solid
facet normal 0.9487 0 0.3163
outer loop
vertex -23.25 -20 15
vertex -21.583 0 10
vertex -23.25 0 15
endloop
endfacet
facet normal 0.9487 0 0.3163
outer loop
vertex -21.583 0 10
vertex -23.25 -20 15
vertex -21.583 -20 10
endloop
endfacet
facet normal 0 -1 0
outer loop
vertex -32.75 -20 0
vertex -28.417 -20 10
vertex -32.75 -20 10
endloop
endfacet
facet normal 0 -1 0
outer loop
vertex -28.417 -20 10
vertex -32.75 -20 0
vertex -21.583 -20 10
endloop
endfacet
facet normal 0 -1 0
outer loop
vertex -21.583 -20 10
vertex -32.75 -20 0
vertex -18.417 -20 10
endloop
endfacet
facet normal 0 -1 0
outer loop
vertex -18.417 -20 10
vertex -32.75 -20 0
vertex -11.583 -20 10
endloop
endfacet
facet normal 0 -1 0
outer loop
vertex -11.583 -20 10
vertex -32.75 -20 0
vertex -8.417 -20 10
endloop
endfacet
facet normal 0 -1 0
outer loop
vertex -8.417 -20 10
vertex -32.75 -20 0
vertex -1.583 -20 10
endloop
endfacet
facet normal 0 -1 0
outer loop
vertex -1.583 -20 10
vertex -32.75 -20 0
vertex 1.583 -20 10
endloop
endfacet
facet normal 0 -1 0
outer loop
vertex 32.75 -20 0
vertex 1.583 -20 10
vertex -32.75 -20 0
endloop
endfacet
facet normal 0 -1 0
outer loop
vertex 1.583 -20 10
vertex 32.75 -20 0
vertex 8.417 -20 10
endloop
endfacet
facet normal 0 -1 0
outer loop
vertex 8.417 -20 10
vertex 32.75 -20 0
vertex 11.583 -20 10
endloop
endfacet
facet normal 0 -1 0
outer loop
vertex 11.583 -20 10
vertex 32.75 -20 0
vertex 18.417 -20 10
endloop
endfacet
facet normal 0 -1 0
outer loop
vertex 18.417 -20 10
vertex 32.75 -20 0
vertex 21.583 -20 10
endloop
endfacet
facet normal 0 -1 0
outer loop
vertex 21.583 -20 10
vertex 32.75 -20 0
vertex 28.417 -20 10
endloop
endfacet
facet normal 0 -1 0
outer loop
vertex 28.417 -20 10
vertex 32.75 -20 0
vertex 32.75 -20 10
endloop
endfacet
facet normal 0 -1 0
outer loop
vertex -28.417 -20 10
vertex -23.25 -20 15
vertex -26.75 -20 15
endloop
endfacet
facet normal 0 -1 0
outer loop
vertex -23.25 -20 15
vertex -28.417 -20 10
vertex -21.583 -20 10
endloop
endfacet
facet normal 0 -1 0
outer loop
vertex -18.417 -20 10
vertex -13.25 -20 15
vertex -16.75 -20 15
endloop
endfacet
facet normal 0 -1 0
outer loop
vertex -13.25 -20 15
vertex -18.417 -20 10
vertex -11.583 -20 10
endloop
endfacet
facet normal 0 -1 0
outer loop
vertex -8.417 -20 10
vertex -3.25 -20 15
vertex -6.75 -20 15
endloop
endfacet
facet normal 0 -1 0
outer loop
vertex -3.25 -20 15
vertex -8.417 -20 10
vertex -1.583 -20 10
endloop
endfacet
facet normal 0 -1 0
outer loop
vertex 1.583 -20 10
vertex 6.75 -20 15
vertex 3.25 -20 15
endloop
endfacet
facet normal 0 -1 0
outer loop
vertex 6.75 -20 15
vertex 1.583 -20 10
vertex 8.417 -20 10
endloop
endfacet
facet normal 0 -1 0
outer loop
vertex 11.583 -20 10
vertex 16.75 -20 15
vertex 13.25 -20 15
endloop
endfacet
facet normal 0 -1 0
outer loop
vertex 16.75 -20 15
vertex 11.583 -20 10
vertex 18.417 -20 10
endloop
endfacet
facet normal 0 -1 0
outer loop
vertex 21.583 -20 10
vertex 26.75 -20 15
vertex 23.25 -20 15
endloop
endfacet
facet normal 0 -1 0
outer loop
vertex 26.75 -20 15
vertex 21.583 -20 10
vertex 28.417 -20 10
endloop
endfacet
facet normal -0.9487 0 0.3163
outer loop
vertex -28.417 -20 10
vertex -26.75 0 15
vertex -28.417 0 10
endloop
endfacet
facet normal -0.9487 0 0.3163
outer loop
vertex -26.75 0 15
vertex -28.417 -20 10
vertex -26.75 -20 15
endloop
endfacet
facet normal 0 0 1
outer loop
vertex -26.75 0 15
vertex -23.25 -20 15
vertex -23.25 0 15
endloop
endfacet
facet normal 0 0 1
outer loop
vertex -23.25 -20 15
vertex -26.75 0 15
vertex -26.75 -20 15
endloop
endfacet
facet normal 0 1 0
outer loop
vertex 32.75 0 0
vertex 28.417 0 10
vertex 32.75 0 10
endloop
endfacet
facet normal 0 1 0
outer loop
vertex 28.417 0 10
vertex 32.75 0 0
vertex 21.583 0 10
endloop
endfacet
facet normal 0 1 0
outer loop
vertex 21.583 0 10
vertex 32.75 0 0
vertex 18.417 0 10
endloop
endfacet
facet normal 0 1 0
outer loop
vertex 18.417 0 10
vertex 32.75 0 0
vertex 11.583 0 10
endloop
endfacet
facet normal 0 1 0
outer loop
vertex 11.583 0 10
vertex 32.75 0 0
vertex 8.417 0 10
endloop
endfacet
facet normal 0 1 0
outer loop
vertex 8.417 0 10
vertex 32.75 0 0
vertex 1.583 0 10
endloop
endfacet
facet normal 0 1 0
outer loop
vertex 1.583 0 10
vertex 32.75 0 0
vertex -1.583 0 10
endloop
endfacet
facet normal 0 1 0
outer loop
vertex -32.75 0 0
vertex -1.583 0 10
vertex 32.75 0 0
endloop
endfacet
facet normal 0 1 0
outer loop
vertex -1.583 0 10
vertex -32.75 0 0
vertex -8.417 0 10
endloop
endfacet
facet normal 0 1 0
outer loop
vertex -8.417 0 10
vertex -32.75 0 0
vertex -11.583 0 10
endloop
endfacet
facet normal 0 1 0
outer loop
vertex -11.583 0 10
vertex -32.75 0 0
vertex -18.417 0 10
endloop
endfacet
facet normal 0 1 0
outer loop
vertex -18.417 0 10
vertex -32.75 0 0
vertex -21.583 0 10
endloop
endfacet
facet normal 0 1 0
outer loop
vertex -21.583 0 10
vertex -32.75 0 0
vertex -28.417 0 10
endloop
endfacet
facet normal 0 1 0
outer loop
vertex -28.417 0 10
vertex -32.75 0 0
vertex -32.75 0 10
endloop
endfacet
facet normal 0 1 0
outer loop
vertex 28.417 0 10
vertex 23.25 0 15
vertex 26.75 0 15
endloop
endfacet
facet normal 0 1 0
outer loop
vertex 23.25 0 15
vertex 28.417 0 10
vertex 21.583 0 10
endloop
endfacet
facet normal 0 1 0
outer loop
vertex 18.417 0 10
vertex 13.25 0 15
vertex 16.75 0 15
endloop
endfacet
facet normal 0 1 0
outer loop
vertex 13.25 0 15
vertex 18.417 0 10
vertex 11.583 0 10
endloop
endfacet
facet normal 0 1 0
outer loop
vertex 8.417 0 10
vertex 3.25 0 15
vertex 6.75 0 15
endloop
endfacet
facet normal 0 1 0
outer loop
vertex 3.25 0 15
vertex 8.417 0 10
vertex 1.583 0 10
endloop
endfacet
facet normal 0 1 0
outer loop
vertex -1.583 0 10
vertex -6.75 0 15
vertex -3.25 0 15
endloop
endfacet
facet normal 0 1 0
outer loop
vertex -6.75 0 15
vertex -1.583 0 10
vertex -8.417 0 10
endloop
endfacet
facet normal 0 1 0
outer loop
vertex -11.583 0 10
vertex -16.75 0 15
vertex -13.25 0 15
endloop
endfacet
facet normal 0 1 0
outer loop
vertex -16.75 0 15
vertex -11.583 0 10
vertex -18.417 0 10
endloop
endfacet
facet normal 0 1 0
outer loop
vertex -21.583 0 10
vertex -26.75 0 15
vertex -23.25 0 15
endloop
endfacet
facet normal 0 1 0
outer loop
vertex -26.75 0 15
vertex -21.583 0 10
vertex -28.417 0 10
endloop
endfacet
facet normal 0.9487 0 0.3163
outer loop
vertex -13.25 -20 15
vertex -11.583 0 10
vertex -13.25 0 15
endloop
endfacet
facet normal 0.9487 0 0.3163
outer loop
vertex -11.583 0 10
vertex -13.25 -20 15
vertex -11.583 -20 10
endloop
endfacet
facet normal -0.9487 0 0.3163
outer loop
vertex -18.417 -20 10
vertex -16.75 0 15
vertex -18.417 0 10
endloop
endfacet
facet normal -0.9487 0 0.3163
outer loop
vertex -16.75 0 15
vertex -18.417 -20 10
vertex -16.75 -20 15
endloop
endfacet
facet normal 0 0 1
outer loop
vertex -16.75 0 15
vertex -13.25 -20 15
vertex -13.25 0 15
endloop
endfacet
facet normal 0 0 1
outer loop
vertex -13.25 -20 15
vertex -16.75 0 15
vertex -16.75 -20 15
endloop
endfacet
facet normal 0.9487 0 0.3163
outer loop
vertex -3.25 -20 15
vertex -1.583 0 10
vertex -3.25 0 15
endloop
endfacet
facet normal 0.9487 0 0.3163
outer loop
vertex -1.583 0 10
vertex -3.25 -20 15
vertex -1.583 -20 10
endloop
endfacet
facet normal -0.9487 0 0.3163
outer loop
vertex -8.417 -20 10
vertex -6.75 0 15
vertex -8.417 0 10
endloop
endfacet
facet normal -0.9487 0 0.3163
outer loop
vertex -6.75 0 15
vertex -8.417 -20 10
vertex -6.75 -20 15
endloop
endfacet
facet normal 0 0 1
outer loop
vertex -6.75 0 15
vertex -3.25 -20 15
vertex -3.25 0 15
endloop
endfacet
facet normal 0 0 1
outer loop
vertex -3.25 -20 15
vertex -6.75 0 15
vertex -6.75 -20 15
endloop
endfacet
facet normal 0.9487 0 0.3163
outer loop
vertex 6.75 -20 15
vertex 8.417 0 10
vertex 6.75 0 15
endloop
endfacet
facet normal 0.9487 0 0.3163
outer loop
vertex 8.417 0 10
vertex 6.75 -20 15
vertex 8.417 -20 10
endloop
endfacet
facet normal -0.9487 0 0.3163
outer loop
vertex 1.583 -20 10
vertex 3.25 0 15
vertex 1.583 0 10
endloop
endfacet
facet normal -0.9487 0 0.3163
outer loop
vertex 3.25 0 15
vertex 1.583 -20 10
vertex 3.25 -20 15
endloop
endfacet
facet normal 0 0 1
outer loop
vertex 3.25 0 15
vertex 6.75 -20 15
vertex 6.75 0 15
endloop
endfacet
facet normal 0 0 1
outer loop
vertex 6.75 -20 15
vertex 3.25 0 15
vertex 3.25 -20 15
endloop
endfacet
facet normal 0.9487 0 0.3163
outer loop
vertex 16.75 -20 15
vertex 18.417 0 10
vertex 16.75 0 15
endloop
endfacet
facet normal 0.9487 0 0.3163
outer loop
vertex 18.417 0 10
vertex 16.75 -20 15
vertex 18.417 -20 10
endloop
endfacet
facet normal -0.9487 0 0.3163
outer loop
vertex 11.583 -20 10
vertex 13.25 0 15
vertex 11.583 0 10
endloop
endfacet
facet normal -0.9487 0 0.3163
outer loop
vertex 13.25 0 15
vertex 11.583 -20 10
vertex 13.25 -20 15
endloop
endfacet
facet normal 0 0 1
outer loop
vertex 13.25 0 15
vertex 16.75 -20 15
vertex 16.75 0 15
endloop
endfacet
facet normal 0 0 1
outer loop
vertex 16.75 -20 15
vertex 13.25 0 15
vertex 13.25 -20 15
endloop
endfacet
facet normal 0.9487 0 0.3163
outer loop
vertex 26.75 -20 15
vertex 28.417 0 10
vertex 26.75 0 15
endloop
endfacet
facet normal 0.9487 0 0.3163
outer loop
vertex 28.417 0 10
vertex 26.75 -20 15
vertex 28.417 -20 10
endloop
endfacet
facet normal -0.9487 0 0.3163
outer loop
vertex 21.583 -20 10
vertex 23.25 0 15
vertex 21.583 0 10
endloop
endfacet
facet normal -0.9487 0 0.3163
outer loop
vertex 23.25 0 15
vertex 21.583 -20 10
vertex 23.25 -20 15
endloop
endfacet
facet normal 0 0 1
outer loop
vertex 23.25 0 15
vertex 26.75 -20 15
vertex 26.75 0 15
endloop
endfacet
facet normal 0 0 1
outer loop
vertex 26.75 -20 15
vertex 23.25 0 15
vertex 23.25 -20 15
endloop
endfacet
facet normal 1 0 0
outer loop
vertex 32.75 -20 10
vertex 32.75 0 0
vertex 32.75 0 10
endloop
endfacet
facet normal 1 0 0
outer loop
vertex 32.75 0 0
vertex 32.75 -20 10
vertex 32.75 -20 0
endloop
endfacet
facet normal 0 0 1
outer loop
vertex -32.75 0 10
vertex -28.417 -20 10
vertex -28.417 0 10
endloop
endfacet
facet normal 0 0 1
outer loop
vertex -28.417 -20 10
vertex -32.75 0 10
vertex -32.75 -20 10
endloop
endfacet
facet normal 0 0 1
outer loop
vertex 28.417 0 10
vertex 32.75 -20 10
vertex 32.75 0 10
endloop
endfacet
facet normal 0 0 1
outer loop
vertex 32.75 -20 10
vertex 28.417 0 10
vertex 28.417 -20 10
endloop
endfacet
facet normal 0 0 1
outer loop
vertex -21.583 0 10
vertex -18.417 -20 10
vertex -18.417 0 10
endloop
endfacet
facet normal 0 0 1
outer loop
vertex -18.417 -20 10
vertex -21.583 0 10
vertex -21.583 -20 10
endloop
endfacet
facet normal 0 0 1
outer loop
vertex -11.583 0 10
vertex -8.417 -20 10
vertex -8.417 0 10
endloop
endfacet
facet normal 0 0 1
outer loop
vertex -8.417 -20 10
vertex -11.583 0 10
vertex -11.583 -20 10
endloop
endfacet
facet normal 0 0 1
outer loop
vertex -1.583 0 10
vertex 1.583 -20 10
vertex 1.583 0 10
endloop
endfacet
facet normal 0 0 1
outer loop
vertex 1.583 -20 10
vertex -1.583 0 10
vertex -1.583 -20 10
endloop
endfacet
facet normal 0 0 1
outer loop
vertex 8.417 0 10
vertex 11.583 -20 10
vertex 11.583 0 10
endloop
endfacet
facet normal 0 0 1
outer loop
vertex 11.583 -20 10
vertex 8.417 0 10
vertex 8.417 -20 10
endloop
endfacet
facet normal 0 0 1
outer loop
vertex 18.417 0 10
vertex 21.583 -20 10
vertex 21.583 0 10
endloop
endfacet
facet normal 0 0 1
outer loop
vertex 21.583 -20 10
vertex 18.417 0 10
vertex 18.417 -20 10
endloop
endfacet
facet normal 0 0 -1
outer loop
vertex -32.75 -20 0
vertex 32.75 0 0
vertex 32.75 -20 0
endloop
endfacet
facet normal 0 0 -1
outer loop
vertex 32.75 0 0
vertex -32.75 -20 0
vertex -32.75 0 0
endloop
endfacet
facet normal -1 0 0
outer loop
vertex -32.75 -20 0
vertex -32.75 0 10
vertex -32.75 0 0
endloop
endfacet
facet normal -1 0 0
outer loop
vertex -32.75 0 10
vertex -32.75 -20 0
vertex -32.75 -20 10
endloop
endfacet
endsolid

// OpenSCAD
$fn = 32;

// ----------------------------------------------------------------------
// Toothed rack, 6 teeth
// 10 mm pitch, 5 mm teeth
// ----------------------------------------------------------------------

// --- parameters (mm) ---
bar_w = 20;     // bar width (Y)
bar_h = 10;     // bar height (Z)
teeth = 6;      // number of teeth
pitch = 10;     // tooth pitch
tooth_h = 5;    // tooth height above the bar
root_w = 7.5;   // tooth width at the root
crest_w = 3.5;  // tooth width at the crest

// --- derived feature positions (mm) ---
span = (teeth - 1) * pitch;  // = 50   distance between the outer teeth
bar_l = span + root_w + 8;   // = 65.5   bar length: teeth plus 4 mm at each end
tooth_x = -span / 2;         // = -25   X of the first tooth
height = bar_h + tooth_h;    // = 15   overall height
feature_centers = [
  [tooth_x + 0 * pitch, -bar_w / 2],
  [tooth_x + 1 * pitch, -bar_w / 2],
  [tooth_x + 2 * pitch, -bar_w / 2],
  [tooth_x + 3 * pitch, -bar_w / 2],
  [tooth_x + 4 * pitch, -bar_w / 2],
  [tooth_x + 5 * pitch, -bar_w / 2]
];   // tooth centre line, drives the tooth loop

// bar with a rack of teeth, one extruded trapezoium per centre
module rack_tooth() {
  linear_extrude(height = bar_w)
    polygon(points = [
      [0, 0],
      [root_w, 0],
      [root_w / 2 + crest_w / 2, tooth_h + 1],
      [root_w / 2 - crest_w / 2, tooth_h + 1]
    ]);
}

union() {
  translate([-bar_l / 2, -bar_w, 0]) cube([bar_l, bar_w, bar_h]);
  for (centre = feature_centers)
    translate([centre[0] - root_w / 2, 0, bar_h - 1]) rotate([90, 0, 0]) rack_tooth();
}
